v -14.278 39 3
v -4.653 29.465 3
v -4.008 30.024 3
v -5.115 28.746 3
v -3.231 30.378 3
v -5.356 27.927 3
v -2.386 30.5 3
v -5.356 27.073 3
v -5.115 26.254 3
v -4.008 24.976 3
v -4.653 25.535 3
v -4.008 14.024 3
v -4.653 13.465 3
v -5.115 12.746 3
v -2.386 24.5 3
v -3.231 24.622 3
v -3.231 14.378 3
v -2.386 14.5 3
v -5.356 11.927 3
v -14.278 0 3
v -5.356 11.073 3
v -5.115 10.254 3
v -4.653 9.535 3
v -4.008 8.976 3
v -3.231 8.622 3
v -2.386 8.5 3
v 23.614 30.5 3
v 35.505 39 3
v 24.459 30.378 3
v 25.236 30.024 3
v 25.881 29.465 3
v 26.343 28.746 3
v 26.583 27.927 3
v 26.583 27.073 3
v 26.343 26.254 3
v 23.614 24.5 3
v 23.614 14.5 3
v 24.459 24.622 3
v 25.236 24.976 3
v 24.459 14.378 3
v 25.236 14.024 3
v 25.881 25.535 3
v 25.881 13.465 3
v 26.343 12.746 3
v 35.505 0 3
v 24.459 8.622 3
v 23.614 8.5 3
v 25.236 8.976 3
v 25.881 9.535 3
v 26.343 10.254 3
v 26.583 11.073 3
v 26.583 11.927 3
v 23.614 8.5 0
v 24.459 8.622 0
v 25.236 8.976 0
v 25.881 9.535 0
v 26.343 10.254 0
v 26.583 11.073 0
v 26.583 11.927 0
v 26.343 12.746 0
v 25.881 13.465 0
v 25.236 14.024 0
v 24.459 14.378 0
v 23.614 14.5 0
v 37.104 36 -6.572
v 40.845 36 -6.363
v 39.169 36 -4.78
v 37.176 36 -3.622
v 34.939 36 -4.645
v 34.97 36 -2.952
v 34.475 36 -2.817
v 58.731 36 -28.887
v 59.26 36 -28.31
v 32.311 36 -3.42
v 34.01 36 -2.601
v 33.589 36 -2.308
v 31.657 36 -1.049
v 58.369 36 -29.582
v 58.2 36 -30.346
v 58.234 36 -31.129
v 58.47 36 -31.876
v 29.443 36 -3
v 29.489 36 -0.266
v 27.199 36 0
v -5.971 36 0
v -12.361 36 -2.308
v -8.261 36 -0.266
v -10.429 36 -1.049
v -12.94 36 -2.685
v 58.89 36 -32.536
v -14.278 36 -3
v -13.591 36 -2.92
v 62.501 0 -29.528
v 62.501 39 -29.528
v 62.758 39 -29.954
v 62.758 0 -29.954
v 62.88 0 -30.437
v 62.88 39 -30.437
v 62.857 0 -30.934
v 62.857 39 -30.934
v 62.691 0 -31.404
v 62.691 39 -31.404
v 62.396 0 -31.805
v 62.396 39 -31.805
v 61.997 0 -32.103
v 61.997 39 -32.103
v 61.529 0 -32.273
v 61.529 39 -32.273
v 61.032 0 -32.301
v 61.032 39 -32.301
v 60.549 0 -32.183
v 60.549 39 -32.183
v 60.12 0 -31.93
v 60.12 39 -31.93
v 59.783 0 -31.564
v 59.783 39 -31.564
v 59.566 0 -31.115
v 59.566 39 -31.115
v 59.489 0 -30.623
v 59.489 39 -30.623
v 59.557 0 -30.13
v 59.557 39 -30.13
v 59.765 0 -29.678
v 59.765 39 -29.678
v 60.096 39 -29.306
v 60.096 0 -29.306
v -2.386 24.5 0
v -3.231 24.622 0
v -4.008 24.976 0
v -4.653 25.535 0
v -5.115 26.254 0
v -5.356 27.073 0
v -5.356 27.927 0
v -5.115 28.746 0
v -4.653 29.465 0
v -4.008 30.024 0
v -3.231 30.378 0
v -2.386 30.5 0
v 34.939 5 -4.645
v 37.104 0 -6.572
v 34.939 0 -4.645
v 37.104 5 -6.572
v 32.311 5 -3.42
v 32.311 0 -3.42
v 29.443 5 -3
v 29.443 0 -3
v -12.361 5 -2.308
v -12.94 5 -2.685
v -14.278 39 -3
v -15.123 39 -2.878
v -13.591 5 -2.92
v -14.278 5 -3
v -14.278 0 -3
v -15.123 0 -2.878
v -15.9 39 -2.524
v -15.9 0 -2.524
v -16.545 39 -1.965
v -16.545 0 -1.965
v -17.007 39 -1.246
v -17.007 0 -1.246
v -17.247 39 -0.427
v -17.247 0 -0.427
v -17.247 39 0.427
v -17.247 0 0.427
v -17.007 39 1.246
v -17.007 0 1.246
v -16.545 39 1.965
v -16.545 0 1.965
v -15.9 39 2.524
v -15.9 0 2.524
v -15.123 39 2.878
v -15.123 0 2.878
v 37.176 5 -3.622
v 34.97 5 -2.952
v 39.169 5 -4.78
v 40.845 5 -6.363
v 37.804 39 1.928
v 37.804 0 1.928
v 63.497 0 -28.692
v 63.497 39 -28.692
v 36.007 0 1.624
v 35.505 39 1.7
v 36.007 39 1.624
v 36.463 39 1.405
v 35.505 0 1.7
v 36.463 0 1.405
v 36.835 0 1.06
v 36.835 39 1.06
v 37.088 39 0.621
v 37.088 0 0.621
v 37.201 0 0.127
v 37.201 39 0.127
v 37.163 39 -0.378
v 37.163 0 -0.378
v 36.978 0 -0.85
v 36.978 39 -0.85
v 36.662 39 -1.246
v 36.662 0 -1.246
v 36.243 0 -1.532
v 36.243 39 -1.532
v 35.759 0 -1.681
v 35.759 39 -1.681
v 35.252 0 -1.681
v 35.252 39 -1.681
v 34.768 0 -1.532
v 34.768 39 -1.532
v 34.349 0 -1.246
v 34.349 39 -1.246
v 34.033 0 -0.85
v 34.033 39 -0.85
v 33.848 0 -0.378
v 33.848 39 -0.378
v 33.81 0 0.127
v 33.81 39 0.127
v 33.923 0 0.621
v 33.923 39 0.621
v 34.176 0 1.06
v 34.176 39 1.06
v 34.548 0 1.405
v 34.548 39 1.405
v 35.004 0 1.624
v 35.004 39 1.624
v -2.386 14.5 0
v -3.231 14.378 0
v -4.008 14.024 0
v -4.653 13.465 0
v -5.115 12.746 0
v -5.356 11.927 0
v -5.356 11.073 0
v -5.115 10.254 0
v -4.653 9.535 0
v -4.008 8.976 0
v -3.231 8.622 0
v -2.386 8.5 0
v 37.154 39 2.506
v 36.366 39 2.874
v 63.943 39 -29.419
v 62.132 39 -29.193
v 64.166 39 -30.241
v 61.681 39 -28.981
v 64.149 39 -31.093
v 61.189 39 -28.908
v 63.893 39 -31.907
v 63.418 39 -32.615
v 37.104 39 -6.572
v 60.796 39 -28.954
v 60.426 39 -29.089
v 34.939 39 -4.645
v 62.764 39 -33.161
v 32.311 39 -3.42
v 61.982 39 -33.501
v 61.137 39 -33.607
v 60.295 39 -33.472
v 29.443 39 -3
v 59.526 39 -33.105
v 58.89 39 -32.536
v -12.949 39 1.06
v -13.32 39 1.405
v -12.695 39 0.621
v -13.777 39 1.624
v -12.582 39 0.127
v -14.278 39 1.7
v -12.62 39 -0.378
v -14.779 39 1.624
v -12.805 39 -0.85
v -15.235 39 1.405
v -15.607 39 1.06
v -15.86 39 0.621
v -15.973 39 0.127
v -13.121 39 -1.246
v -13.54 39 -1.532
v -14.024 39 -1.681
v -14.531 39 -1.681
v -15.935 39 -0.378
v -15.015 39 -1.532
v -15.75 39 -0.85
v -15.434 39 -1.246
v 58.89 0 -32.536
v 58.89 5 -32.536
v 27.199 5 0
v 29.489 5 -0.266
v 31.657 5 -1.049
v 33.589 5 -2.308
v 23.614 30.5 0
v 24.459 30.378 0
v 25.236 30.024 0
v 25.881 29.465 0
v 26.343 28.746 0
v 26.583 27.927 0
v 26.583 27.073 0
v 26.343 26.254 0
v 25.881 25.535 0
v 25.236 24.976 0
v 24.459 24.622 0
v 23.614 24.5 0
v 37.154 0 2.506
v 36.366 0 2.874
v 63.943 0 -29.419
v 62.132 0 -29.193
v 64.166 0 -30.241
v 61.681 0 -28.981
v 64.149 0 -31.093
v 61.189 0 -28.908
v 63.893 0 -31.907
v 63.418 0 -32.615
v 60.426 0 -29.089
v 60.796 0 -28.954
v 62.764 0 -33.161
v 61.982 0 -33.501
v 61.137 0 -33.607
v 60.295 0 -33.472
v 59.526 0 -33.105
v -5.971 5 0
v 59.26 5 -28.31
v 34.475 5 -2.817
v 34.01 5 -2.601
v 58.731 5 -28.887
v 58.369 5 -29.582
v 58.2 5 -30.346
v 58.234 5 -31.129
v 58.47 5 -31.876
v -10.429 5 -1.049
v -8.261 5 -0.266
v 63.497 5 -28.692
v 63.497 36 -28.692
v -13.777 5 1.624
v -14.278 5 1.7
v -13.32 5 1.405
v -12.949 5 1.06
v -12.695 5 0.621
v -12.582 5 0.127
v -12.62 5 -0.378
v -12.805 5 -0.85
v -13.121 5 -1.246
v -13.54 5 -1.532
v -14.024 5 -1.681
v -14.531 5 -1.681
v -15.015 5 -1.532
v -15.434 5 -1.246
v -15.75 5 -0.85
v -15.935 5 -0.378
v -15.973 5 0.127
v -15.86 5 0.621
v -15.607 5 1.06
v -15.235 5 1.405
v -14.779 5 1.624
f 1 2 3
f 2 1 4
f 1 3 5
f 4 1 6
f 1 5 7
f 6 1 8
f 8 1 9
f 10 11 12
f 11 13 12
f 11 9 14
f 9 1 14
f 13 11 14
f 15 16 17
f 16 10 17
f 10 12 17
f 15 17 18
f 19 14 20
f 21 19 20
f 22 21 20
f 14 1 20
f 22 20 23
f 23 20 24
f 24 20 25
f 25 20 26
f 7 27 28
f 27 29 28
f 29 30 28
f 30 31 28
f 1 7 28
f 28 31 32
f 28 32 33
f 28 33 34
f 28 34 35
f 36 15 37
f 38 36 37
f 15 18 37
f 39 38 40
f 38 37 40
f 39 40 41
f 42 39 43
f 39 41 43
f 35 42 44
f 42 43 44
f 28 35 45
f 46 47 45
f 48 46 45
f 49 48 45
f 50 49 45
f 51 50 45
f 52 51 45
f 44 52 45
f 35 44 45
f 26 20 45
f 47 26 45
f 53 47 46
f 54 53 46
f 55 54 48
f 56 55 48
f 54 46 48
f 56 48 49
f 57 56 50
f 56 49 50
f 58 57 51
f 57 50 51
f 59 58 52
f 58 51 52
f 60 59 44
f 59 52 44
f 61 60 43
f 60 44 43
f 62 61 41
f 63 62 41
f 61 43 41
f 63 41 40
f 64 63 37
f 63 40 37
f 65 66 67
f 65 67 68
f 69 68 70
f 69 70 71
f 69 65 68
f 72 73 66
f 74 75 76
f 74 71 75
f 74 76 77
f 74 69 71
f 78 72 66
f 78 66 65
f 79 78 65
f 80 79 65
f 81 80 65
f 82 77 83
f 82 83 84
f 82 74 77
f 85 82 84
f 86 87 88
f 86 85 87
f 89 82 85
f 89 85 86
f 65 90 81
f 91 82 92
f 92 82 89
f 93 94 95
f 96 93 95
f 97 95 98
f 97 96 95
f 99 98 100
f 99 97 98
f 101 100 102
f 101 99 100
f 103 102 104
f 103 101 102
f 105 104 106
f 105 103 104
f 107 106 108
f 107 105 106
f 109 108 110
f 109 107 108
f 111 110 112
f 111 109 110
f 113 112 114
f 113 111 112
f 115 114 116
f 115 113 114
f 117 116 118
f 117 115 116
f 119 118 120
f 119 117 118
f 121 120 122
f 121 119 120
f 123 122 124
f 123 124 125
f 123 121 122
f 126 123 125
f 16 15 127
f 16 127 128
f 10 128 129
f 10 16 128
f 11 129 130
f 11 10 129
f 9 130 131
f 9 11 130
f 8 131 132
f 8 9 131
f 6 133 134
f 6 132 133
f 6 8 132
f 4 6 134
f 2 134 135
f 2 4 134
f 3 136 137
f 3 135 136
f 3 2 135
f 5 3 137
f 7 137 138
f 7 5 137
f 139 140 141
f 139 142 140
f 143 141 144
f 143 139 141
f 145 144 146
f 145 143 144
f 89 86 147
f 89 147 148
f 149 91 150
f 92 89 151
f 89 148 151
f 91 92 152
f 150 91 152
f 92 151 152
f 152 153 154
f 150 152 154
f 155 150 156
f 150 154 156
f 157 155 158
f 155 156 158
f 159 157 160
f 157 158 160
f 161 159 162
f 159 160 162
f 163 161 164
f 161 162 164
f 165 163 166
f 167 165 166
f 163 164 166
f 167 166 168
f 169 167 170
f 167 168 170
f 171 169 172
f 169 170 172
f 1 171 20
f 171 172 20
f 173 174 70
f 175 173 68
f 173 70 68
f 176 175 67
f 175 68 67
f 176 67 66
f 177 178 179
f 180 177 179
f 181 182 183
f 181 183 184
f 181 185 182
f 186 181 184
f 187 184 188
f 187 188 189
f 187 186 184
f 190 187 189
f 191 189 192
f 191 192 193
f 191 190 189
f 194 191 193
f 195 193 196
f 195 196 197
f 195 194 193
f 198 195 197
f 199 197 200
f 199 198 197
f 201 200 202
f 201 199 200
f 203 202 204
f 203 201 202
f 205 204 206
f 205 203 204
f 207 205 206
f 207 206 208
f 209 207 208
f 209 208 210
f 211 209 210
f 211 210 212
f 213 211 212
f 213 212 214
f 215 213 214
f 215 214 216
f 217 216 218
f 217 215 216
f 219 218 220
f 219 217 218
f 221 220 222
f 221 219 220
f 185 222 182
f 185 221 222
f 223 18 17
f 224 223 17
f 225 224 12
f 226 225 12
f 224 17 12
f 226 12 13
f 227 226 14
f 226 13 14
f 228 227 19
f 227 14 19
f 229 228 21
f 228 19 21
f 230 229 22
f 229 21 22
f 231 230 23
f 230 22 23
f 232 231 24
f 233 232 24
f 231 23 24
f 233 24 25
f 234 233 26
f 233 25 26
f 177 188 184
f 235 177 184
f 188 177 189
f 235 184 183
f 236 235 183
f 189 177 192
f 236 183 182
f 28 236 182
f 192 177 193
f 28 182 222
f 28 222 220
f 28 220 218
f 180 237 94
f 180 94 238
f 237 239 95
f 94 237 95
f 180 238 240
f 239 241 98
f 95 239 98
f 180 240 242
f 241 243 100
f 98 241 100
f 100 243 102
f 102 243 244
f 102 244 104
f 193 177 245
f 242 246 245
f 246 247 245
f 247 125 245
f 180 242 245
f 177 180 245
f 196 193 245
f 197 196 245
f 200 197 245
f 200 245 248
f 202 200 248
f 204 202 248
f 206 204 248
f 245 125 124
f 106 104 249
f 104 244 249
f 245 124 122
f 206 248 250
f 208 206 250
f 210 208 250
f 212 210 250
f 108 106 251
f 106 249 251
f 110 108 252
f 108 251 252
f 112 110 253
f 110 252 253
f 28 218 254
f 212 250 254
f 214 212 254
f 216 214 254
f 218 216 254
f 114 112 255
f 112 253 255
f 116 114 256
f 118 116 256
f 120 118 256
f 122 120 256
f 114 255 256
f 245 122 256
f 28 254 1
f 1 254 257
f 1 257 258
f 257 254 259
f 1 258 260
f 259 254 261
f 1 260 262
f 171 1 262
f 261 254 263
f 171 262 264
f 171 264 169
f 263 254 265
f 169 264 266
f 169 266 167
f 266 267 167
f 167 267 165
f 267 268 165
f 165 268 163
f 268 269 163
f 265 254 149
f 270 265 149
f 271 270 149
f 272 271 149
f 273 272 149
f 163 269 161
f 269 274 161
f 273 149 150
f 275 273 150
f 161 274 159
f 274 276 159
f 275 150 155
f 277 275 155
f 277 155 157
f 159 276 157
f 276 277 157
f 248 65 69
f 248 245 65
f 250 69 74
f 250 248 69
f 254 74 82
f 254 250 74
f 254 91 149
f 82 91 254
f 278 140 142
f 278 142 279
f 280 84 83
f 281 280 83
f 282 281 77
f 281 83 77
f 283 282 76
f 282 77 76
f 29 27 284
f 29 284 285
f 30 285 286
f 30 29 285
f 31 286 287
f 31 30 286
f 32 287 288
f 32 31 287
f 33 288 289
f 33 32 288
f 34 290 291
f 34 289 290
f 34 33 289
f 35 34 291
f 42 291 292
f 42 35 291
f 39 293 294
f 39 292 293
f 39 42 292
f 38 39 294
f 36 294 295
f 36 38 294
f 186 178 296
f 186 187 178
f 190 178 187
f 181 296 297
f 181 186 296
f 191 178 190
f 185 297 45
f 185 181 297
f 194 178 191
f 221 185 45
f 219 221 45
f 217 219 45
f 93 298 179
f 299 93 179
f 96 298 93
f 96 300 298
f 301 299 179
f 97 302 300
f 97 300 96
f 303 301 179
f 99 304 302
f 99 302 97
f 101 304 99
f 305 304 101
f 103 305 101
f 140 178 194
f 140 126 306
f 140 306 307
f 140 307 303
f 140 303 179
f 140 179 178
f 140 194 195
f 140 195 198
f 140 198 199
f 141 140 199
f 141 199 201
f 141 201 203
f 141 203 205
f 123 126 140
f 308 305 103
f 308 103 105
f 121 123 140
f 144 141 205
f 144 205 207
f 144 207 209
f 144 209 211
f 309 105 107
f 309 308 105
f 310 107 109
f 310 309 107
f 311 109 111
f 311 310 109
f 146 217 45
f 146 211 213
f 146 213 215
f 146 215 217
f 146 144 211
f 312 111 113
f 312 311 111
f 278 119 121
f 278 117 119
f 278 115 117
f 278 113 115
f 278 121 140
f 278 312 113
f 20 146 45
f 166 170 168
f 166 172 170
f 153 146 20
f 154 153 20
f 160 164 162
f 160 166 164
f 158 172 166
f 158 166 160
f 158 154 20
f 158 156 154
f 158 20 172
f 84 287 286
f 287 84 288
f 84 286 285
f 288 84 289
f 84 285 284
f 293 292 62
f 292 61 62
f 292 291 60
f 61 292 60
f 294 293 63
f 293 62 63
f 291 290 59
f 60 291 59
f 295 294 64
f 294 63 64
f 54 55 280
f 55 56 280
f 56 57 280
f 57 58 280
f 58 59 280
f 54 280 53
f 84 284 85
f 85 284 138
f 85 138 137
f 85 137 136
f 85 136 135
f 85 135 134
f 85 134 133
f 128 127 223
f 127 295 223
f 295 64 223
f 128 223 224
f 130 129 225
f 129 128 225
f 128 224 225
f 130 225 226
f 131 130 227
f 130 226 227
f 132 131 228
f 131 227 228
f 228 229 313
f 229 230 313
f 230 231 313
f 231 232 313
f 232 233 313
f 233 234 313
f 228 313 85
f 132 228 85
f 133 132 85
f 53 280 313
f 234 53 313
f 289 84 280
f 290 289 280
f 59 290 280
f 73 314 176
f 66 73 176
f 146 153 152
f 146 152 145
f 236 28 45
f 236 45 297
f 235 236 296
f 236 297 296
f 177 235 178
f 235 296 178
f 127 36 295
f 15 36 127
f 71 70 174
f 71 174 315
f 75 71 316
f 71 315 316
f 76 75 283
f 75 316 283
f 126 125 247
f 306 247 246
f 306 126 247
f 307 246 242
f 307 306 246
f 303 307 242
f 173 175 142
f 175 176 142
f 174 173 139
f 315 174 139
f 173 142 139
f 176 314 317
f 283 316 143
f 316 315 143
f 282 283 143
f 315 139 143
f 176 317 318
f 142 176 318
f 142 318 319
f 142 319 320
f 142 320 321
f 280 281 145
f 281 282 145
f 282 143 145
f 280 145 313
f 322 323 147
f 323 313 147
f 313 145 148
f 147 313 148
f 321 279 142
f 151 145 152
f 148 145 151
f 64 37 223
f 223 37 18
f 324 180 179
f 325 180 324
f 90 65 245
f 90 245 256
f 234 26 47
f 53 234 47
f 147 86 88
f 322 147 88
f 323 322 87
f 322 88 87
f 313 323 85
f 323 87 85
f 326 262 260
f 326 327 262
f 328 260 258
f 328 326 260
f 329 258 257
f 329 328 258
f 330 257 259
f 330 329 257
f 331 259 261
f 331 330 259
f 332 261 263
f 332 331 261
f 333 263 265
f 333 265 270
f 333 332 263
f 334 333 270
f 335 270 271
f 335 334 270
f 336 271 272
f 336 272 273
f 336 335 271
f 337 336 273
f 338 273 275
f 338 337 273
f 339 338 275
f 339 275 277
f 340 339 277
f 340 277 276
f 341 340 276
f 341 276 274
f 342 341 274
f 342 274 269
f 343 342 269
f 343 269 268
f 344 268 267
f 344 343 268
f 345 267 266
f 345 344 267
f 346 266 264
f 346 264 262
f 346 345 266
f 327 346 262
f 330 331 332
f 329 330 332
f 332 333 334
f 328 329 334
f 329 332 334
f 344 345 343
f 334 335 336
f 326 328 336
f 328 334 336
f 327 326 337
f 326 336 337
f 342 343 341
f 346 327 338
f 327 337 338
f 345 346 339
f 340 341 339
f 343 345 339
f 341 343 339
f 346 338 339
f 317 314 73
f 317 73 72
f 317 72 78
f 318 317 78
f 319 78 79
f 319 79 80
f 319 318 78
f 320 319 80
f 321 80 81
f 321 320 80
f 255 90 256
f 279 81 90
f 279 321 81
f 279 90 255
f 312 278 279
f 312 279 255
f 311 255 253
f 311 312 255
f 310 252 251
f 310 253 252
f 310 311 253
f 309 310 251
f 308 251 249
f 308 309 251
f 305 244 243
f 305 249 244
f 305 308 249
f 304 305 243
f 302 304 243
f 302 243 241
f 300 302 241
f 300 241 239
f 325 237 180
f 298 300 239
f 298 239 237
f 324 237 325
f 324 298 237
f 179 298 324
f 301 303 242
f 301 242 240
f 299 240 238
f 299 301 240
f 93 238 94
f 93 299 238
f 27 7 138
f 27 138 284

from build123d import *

# Parameters (mm, degrees)
SKETCH_1_R          = 1.7
EXTRUDE_1_DEPTH     = 39
FILLET_1_R          = 10
SKETCH_3_R          = 1.7
EXTRUDE_2_DEPTH     = 5
EXTRUDE_START       = -3
SKETCH_4_R          = 1.7
EXTRUDE_3_DEPTH     = 3
CUT_EXTRUDE_2_DEPTH = 5
SKETCH_6_R          = 1.7
EXTRUDE_4_DEPTH     = 3
SKETCH_7_R          = 1.7
EXTRUDE_5_DEPTH     = 5
SKETCH_8_R          = 3
SKETCH_8_R_2        = 1.7
EXTRUDE_6_DEPTH     = 39
SKETCH_9_R          = 1.7
CUT_EXTRUDE_3_DEPTH = 100
FILLET_2_R          = 10


with BuildPart() as part:
    # 草图1 → 凸台-拉伸1 (new body)
    with BuildSketch(Plane(origin=(0, 0, 0), x_dir=(1, 0, 0), z_dir=(0, 1, 0))):
        with BuildLine():
            Line((-14.277701198, -3), (35.505461262, -3))
            ThreePointArc((35.505461262, -3), (36.773316047, -2.718923361), (37.803594591, -1.928362829))
            Line((37.803594591, -1.928362829), (63.497014217, 28.691862316))
            Line((63.497014217, 28.691862316), (61.198880888, 30.620225145))
            Line((61.198880888, 30.620225145), (37.433824091, 2.298133329))
            ThreePointArc((37.433824091, 2.298133329), (34.237606477, 2.718923361), (32.505461262, 0))
            Line((32.505461262, 0), (-11.277701198, 0))
            ThreePointArc((-11.277701198, 0), (-16.399021541, 2.121320344), (-14.277701198, -3))
        make_face()
        with Locations(Location((-14.277701198, 0, 0), (0, 0, 270))):
            Circle(SKETCH_1_R, mode=Mode.SUBTRACT)
        with Locations(Location((35.505461262, 0, 0), (0, 0, 270))):
            Circle(SKETCH_1_R, mode=Mode.SUBTRACT)
    extrude(amount=EXTRUDE_1_DEPTH)

    # 圆角1
    fillet_1_edges = [part.edges().sort_by_distance(p)[0] for p in [
        (37.433824091, 19.5, -2.298133329),
        (-11.277701198, 19.5, 0),
        (32.505461262, 19.5, 0),
    ]]
    fillet(fillet_1_edges, radius=FILLET_1_R)

    # 草图3 → 凸台-拉伸2 (add)
    with BuildSketch(Plane(origin=(0, 0, 0), x_dir=(1, 0, 0), z_dir=(0, 1, 0))):
        with BuildLine():
            Line((-14.277701198, 3), (35.505461262, 3))
            ThreePointArc((35.505461262, 3), (38.505461262, 0), (35.505461262, -3))
            Line((35.505461262, -3), (-14.277701198, -3))
            ThreePointArc((-14.277701198, -3), (-17.277701198, 0), (-14.277701198, 3))
        make_face()
        with Locations(Location((35.505461262, 0, 0), (0, 0, 270))):
            Circle(SKETCH_3_R, mode=Mode.SUBTRACT)
    extrude(amount=EXTRUDE_2_DEPTH)

    # 草图4 → 凸台-拉伸3 (add)
    with BuildSketch(Plane(origin=(0, 39, 0), x_dir=(1, 0, 0), z_dir=(0, 1, 0)).offset(EXTRUDE_START)):
        with BuildLine():
            Line((-14.277701198, 3), (35.505461262, 3))
            ThreePointArc((35.505461262, 3), (38.505461262, 0), (35.505461262, -3))
            Line((35.505461262, -3), (-14.277701198, -3))
            ThreePointArc((-14.277701198, -3), (-17.277701198, 0), (-14.277701198, 3))
        make_face()
        with Locations(Location((-14.277701198, 0, 0), (0, 0, 270))):
            Circle(SKETCH_4_R, mode=Mode.SUBTRACT)
        with Locations(Location((35.505461262, 0, 0), (0, 0, 270))):
            Circle(SKETCH_4_R, mode=Mode.SUBTRACT)
    extrude(amount=EXTRUDE_3_DEPTH)

    # 草图5 → 切除-拉伸2 (cut)
    with BuildSketch(Plane.XY.offset(3)):
        with BuildLine():
            Line((-2.386119968, 30.5), (23.613880032, 30.5))
            ThreePointArc((23.613880032, 30.5), (26.613880032, 27.5), (23.613880032, 24.5))
            Line((23.613880032, 24.5), (-2.386119968, 24.5))
            ThreePointArc((-2.386119968, 24.5), (-5.386119968, 27.5), (-2.386119968, 30.5))
        make_face()
        with BuildLine():
            Line((-2.386119968, 8.5), (23.613880032, 8.5))
            ThreePointArc((23.613880032, 8.5), (26.613880032, 11.5), (23.613880032, 14.5))
            Line((23.613880032, 14.5), (-2.386119968, 14.5))
            ThreePointArc((-2.386119968, 14.5), (-5.386119968, 11.5), (-2.386119968, 8.5))
        make_face()
    extrude(amount=-CUT_EXTRUDE_2_DEPTH, mode=Mode.SUBTRACT)

    # 草图6 → 凸台-拉伸4 (add)
    with BuildSketch(Plane(origin=(0, 39, 0), x_dir=(1, 0, 0), z_dir=(0, 1, 0)).offset(EXTRUDE_START)):
        with BuildLine():
            Line((33.207327933, 1.928362829), (58.890388489, 32.536242516))
            ThreePointArc((58.890388489, 32.536242516), (63.116884647, 32.906013016), (63.486655148, 28.679516858))
            Line((63.486655148, 28.679516858), (37.803594591, -1.928362829))
            ThreePointArc((37.803594591, -1.928362829), (33.577098433, -2.298133329), (33.207327933, 1.928362829))
        make_face()
        with Locations(Location((35.505461262, 0, 0), (0, 0, 270))):
            Circle(SKETCH_6_R, mode=Mode.SUBTRACT)
        with Locations((61.188521818, 30.607879687)):
            Circle(SKETCH_6_R, mode=Mode.SUBTRACT)
    extrude(amount=EXTRUDE_4_DEPTH)

    # 草图7 → 凸台-拉伸5 (add)
    with BuildSketch(Plane(origin=(0, 0, 0), x_dir=(1, 0, 0), z_dir=(0, 1, 0))):
        with BuildLine():
            Line((33.207327933, 1.928362829), (58.890388489, 32.536242516))
            ThreePointArc((58.890388489, 32.536242516), (63.116884647, 32.906013016), (63.486655148, 28.679516858))
            Line((63.486655148, 28.679516858), (37.803594591, -1.928362829))
            ThreePointArc((37.803594591, -1.928362829), (33.577098433, -2.298133329), (33.207327933, 1.928362829))
        make_face()
        with Locations(Location((35.505461262, 0, 0), (0, 0, 270))):
            Circle(SKETCH_7_R, mode=Mode.SUBTRACT)
        with Locations((61.188521818, 30.607879687)):
            Circle(SKETCH_7_R, mode=Mode.SUBTRACT)
    extrude(amount=EXTRUDE_5_DEPTH)

    # 草图8 → 凸台-拉伸6 (add)
    with BuildSketch(Plane(origin=(0, 0, 0), x_dir=(1, 0, 0), z_dir=(0, 1, 0))):
        with Locations((61.188521818, 30.607879687)):
            Circle(SKETCH_8_R)
        with Locations((61.188521818, 30.607879687)):
            Circle(SKETCH_8_R_2, mode=Mode.SUBTRACT)
    extrude(amount=EXTRUDE_6_DEPTH)

    # 草图9 → 切除-拉伸3 (cut)
    with BuildSketch(Plane(origin=(0, 0, 0), x_dir=(1, 0, 0), z_dir=(0, 1, 0))):
        with Locations(Location((61.188521818, 30.607879687, 0), (0, 0, 270))):
            Circle(SKETCH_9_R)
    extrude(amount=CUT_EXTRUDE_3_DEPTH, mode=Mode.SUBTRACT)

    # 圆角2
    fillet_2_edges = [part.edges().sort_by_distance(p)[0] for p in [
        (34.106538287, 37.5, -3),
        (34.106538287, 2.5, -3),
    ]]
    fillet(fillet_2_edges, radius=FILLET_2_R)


solid = part.part
